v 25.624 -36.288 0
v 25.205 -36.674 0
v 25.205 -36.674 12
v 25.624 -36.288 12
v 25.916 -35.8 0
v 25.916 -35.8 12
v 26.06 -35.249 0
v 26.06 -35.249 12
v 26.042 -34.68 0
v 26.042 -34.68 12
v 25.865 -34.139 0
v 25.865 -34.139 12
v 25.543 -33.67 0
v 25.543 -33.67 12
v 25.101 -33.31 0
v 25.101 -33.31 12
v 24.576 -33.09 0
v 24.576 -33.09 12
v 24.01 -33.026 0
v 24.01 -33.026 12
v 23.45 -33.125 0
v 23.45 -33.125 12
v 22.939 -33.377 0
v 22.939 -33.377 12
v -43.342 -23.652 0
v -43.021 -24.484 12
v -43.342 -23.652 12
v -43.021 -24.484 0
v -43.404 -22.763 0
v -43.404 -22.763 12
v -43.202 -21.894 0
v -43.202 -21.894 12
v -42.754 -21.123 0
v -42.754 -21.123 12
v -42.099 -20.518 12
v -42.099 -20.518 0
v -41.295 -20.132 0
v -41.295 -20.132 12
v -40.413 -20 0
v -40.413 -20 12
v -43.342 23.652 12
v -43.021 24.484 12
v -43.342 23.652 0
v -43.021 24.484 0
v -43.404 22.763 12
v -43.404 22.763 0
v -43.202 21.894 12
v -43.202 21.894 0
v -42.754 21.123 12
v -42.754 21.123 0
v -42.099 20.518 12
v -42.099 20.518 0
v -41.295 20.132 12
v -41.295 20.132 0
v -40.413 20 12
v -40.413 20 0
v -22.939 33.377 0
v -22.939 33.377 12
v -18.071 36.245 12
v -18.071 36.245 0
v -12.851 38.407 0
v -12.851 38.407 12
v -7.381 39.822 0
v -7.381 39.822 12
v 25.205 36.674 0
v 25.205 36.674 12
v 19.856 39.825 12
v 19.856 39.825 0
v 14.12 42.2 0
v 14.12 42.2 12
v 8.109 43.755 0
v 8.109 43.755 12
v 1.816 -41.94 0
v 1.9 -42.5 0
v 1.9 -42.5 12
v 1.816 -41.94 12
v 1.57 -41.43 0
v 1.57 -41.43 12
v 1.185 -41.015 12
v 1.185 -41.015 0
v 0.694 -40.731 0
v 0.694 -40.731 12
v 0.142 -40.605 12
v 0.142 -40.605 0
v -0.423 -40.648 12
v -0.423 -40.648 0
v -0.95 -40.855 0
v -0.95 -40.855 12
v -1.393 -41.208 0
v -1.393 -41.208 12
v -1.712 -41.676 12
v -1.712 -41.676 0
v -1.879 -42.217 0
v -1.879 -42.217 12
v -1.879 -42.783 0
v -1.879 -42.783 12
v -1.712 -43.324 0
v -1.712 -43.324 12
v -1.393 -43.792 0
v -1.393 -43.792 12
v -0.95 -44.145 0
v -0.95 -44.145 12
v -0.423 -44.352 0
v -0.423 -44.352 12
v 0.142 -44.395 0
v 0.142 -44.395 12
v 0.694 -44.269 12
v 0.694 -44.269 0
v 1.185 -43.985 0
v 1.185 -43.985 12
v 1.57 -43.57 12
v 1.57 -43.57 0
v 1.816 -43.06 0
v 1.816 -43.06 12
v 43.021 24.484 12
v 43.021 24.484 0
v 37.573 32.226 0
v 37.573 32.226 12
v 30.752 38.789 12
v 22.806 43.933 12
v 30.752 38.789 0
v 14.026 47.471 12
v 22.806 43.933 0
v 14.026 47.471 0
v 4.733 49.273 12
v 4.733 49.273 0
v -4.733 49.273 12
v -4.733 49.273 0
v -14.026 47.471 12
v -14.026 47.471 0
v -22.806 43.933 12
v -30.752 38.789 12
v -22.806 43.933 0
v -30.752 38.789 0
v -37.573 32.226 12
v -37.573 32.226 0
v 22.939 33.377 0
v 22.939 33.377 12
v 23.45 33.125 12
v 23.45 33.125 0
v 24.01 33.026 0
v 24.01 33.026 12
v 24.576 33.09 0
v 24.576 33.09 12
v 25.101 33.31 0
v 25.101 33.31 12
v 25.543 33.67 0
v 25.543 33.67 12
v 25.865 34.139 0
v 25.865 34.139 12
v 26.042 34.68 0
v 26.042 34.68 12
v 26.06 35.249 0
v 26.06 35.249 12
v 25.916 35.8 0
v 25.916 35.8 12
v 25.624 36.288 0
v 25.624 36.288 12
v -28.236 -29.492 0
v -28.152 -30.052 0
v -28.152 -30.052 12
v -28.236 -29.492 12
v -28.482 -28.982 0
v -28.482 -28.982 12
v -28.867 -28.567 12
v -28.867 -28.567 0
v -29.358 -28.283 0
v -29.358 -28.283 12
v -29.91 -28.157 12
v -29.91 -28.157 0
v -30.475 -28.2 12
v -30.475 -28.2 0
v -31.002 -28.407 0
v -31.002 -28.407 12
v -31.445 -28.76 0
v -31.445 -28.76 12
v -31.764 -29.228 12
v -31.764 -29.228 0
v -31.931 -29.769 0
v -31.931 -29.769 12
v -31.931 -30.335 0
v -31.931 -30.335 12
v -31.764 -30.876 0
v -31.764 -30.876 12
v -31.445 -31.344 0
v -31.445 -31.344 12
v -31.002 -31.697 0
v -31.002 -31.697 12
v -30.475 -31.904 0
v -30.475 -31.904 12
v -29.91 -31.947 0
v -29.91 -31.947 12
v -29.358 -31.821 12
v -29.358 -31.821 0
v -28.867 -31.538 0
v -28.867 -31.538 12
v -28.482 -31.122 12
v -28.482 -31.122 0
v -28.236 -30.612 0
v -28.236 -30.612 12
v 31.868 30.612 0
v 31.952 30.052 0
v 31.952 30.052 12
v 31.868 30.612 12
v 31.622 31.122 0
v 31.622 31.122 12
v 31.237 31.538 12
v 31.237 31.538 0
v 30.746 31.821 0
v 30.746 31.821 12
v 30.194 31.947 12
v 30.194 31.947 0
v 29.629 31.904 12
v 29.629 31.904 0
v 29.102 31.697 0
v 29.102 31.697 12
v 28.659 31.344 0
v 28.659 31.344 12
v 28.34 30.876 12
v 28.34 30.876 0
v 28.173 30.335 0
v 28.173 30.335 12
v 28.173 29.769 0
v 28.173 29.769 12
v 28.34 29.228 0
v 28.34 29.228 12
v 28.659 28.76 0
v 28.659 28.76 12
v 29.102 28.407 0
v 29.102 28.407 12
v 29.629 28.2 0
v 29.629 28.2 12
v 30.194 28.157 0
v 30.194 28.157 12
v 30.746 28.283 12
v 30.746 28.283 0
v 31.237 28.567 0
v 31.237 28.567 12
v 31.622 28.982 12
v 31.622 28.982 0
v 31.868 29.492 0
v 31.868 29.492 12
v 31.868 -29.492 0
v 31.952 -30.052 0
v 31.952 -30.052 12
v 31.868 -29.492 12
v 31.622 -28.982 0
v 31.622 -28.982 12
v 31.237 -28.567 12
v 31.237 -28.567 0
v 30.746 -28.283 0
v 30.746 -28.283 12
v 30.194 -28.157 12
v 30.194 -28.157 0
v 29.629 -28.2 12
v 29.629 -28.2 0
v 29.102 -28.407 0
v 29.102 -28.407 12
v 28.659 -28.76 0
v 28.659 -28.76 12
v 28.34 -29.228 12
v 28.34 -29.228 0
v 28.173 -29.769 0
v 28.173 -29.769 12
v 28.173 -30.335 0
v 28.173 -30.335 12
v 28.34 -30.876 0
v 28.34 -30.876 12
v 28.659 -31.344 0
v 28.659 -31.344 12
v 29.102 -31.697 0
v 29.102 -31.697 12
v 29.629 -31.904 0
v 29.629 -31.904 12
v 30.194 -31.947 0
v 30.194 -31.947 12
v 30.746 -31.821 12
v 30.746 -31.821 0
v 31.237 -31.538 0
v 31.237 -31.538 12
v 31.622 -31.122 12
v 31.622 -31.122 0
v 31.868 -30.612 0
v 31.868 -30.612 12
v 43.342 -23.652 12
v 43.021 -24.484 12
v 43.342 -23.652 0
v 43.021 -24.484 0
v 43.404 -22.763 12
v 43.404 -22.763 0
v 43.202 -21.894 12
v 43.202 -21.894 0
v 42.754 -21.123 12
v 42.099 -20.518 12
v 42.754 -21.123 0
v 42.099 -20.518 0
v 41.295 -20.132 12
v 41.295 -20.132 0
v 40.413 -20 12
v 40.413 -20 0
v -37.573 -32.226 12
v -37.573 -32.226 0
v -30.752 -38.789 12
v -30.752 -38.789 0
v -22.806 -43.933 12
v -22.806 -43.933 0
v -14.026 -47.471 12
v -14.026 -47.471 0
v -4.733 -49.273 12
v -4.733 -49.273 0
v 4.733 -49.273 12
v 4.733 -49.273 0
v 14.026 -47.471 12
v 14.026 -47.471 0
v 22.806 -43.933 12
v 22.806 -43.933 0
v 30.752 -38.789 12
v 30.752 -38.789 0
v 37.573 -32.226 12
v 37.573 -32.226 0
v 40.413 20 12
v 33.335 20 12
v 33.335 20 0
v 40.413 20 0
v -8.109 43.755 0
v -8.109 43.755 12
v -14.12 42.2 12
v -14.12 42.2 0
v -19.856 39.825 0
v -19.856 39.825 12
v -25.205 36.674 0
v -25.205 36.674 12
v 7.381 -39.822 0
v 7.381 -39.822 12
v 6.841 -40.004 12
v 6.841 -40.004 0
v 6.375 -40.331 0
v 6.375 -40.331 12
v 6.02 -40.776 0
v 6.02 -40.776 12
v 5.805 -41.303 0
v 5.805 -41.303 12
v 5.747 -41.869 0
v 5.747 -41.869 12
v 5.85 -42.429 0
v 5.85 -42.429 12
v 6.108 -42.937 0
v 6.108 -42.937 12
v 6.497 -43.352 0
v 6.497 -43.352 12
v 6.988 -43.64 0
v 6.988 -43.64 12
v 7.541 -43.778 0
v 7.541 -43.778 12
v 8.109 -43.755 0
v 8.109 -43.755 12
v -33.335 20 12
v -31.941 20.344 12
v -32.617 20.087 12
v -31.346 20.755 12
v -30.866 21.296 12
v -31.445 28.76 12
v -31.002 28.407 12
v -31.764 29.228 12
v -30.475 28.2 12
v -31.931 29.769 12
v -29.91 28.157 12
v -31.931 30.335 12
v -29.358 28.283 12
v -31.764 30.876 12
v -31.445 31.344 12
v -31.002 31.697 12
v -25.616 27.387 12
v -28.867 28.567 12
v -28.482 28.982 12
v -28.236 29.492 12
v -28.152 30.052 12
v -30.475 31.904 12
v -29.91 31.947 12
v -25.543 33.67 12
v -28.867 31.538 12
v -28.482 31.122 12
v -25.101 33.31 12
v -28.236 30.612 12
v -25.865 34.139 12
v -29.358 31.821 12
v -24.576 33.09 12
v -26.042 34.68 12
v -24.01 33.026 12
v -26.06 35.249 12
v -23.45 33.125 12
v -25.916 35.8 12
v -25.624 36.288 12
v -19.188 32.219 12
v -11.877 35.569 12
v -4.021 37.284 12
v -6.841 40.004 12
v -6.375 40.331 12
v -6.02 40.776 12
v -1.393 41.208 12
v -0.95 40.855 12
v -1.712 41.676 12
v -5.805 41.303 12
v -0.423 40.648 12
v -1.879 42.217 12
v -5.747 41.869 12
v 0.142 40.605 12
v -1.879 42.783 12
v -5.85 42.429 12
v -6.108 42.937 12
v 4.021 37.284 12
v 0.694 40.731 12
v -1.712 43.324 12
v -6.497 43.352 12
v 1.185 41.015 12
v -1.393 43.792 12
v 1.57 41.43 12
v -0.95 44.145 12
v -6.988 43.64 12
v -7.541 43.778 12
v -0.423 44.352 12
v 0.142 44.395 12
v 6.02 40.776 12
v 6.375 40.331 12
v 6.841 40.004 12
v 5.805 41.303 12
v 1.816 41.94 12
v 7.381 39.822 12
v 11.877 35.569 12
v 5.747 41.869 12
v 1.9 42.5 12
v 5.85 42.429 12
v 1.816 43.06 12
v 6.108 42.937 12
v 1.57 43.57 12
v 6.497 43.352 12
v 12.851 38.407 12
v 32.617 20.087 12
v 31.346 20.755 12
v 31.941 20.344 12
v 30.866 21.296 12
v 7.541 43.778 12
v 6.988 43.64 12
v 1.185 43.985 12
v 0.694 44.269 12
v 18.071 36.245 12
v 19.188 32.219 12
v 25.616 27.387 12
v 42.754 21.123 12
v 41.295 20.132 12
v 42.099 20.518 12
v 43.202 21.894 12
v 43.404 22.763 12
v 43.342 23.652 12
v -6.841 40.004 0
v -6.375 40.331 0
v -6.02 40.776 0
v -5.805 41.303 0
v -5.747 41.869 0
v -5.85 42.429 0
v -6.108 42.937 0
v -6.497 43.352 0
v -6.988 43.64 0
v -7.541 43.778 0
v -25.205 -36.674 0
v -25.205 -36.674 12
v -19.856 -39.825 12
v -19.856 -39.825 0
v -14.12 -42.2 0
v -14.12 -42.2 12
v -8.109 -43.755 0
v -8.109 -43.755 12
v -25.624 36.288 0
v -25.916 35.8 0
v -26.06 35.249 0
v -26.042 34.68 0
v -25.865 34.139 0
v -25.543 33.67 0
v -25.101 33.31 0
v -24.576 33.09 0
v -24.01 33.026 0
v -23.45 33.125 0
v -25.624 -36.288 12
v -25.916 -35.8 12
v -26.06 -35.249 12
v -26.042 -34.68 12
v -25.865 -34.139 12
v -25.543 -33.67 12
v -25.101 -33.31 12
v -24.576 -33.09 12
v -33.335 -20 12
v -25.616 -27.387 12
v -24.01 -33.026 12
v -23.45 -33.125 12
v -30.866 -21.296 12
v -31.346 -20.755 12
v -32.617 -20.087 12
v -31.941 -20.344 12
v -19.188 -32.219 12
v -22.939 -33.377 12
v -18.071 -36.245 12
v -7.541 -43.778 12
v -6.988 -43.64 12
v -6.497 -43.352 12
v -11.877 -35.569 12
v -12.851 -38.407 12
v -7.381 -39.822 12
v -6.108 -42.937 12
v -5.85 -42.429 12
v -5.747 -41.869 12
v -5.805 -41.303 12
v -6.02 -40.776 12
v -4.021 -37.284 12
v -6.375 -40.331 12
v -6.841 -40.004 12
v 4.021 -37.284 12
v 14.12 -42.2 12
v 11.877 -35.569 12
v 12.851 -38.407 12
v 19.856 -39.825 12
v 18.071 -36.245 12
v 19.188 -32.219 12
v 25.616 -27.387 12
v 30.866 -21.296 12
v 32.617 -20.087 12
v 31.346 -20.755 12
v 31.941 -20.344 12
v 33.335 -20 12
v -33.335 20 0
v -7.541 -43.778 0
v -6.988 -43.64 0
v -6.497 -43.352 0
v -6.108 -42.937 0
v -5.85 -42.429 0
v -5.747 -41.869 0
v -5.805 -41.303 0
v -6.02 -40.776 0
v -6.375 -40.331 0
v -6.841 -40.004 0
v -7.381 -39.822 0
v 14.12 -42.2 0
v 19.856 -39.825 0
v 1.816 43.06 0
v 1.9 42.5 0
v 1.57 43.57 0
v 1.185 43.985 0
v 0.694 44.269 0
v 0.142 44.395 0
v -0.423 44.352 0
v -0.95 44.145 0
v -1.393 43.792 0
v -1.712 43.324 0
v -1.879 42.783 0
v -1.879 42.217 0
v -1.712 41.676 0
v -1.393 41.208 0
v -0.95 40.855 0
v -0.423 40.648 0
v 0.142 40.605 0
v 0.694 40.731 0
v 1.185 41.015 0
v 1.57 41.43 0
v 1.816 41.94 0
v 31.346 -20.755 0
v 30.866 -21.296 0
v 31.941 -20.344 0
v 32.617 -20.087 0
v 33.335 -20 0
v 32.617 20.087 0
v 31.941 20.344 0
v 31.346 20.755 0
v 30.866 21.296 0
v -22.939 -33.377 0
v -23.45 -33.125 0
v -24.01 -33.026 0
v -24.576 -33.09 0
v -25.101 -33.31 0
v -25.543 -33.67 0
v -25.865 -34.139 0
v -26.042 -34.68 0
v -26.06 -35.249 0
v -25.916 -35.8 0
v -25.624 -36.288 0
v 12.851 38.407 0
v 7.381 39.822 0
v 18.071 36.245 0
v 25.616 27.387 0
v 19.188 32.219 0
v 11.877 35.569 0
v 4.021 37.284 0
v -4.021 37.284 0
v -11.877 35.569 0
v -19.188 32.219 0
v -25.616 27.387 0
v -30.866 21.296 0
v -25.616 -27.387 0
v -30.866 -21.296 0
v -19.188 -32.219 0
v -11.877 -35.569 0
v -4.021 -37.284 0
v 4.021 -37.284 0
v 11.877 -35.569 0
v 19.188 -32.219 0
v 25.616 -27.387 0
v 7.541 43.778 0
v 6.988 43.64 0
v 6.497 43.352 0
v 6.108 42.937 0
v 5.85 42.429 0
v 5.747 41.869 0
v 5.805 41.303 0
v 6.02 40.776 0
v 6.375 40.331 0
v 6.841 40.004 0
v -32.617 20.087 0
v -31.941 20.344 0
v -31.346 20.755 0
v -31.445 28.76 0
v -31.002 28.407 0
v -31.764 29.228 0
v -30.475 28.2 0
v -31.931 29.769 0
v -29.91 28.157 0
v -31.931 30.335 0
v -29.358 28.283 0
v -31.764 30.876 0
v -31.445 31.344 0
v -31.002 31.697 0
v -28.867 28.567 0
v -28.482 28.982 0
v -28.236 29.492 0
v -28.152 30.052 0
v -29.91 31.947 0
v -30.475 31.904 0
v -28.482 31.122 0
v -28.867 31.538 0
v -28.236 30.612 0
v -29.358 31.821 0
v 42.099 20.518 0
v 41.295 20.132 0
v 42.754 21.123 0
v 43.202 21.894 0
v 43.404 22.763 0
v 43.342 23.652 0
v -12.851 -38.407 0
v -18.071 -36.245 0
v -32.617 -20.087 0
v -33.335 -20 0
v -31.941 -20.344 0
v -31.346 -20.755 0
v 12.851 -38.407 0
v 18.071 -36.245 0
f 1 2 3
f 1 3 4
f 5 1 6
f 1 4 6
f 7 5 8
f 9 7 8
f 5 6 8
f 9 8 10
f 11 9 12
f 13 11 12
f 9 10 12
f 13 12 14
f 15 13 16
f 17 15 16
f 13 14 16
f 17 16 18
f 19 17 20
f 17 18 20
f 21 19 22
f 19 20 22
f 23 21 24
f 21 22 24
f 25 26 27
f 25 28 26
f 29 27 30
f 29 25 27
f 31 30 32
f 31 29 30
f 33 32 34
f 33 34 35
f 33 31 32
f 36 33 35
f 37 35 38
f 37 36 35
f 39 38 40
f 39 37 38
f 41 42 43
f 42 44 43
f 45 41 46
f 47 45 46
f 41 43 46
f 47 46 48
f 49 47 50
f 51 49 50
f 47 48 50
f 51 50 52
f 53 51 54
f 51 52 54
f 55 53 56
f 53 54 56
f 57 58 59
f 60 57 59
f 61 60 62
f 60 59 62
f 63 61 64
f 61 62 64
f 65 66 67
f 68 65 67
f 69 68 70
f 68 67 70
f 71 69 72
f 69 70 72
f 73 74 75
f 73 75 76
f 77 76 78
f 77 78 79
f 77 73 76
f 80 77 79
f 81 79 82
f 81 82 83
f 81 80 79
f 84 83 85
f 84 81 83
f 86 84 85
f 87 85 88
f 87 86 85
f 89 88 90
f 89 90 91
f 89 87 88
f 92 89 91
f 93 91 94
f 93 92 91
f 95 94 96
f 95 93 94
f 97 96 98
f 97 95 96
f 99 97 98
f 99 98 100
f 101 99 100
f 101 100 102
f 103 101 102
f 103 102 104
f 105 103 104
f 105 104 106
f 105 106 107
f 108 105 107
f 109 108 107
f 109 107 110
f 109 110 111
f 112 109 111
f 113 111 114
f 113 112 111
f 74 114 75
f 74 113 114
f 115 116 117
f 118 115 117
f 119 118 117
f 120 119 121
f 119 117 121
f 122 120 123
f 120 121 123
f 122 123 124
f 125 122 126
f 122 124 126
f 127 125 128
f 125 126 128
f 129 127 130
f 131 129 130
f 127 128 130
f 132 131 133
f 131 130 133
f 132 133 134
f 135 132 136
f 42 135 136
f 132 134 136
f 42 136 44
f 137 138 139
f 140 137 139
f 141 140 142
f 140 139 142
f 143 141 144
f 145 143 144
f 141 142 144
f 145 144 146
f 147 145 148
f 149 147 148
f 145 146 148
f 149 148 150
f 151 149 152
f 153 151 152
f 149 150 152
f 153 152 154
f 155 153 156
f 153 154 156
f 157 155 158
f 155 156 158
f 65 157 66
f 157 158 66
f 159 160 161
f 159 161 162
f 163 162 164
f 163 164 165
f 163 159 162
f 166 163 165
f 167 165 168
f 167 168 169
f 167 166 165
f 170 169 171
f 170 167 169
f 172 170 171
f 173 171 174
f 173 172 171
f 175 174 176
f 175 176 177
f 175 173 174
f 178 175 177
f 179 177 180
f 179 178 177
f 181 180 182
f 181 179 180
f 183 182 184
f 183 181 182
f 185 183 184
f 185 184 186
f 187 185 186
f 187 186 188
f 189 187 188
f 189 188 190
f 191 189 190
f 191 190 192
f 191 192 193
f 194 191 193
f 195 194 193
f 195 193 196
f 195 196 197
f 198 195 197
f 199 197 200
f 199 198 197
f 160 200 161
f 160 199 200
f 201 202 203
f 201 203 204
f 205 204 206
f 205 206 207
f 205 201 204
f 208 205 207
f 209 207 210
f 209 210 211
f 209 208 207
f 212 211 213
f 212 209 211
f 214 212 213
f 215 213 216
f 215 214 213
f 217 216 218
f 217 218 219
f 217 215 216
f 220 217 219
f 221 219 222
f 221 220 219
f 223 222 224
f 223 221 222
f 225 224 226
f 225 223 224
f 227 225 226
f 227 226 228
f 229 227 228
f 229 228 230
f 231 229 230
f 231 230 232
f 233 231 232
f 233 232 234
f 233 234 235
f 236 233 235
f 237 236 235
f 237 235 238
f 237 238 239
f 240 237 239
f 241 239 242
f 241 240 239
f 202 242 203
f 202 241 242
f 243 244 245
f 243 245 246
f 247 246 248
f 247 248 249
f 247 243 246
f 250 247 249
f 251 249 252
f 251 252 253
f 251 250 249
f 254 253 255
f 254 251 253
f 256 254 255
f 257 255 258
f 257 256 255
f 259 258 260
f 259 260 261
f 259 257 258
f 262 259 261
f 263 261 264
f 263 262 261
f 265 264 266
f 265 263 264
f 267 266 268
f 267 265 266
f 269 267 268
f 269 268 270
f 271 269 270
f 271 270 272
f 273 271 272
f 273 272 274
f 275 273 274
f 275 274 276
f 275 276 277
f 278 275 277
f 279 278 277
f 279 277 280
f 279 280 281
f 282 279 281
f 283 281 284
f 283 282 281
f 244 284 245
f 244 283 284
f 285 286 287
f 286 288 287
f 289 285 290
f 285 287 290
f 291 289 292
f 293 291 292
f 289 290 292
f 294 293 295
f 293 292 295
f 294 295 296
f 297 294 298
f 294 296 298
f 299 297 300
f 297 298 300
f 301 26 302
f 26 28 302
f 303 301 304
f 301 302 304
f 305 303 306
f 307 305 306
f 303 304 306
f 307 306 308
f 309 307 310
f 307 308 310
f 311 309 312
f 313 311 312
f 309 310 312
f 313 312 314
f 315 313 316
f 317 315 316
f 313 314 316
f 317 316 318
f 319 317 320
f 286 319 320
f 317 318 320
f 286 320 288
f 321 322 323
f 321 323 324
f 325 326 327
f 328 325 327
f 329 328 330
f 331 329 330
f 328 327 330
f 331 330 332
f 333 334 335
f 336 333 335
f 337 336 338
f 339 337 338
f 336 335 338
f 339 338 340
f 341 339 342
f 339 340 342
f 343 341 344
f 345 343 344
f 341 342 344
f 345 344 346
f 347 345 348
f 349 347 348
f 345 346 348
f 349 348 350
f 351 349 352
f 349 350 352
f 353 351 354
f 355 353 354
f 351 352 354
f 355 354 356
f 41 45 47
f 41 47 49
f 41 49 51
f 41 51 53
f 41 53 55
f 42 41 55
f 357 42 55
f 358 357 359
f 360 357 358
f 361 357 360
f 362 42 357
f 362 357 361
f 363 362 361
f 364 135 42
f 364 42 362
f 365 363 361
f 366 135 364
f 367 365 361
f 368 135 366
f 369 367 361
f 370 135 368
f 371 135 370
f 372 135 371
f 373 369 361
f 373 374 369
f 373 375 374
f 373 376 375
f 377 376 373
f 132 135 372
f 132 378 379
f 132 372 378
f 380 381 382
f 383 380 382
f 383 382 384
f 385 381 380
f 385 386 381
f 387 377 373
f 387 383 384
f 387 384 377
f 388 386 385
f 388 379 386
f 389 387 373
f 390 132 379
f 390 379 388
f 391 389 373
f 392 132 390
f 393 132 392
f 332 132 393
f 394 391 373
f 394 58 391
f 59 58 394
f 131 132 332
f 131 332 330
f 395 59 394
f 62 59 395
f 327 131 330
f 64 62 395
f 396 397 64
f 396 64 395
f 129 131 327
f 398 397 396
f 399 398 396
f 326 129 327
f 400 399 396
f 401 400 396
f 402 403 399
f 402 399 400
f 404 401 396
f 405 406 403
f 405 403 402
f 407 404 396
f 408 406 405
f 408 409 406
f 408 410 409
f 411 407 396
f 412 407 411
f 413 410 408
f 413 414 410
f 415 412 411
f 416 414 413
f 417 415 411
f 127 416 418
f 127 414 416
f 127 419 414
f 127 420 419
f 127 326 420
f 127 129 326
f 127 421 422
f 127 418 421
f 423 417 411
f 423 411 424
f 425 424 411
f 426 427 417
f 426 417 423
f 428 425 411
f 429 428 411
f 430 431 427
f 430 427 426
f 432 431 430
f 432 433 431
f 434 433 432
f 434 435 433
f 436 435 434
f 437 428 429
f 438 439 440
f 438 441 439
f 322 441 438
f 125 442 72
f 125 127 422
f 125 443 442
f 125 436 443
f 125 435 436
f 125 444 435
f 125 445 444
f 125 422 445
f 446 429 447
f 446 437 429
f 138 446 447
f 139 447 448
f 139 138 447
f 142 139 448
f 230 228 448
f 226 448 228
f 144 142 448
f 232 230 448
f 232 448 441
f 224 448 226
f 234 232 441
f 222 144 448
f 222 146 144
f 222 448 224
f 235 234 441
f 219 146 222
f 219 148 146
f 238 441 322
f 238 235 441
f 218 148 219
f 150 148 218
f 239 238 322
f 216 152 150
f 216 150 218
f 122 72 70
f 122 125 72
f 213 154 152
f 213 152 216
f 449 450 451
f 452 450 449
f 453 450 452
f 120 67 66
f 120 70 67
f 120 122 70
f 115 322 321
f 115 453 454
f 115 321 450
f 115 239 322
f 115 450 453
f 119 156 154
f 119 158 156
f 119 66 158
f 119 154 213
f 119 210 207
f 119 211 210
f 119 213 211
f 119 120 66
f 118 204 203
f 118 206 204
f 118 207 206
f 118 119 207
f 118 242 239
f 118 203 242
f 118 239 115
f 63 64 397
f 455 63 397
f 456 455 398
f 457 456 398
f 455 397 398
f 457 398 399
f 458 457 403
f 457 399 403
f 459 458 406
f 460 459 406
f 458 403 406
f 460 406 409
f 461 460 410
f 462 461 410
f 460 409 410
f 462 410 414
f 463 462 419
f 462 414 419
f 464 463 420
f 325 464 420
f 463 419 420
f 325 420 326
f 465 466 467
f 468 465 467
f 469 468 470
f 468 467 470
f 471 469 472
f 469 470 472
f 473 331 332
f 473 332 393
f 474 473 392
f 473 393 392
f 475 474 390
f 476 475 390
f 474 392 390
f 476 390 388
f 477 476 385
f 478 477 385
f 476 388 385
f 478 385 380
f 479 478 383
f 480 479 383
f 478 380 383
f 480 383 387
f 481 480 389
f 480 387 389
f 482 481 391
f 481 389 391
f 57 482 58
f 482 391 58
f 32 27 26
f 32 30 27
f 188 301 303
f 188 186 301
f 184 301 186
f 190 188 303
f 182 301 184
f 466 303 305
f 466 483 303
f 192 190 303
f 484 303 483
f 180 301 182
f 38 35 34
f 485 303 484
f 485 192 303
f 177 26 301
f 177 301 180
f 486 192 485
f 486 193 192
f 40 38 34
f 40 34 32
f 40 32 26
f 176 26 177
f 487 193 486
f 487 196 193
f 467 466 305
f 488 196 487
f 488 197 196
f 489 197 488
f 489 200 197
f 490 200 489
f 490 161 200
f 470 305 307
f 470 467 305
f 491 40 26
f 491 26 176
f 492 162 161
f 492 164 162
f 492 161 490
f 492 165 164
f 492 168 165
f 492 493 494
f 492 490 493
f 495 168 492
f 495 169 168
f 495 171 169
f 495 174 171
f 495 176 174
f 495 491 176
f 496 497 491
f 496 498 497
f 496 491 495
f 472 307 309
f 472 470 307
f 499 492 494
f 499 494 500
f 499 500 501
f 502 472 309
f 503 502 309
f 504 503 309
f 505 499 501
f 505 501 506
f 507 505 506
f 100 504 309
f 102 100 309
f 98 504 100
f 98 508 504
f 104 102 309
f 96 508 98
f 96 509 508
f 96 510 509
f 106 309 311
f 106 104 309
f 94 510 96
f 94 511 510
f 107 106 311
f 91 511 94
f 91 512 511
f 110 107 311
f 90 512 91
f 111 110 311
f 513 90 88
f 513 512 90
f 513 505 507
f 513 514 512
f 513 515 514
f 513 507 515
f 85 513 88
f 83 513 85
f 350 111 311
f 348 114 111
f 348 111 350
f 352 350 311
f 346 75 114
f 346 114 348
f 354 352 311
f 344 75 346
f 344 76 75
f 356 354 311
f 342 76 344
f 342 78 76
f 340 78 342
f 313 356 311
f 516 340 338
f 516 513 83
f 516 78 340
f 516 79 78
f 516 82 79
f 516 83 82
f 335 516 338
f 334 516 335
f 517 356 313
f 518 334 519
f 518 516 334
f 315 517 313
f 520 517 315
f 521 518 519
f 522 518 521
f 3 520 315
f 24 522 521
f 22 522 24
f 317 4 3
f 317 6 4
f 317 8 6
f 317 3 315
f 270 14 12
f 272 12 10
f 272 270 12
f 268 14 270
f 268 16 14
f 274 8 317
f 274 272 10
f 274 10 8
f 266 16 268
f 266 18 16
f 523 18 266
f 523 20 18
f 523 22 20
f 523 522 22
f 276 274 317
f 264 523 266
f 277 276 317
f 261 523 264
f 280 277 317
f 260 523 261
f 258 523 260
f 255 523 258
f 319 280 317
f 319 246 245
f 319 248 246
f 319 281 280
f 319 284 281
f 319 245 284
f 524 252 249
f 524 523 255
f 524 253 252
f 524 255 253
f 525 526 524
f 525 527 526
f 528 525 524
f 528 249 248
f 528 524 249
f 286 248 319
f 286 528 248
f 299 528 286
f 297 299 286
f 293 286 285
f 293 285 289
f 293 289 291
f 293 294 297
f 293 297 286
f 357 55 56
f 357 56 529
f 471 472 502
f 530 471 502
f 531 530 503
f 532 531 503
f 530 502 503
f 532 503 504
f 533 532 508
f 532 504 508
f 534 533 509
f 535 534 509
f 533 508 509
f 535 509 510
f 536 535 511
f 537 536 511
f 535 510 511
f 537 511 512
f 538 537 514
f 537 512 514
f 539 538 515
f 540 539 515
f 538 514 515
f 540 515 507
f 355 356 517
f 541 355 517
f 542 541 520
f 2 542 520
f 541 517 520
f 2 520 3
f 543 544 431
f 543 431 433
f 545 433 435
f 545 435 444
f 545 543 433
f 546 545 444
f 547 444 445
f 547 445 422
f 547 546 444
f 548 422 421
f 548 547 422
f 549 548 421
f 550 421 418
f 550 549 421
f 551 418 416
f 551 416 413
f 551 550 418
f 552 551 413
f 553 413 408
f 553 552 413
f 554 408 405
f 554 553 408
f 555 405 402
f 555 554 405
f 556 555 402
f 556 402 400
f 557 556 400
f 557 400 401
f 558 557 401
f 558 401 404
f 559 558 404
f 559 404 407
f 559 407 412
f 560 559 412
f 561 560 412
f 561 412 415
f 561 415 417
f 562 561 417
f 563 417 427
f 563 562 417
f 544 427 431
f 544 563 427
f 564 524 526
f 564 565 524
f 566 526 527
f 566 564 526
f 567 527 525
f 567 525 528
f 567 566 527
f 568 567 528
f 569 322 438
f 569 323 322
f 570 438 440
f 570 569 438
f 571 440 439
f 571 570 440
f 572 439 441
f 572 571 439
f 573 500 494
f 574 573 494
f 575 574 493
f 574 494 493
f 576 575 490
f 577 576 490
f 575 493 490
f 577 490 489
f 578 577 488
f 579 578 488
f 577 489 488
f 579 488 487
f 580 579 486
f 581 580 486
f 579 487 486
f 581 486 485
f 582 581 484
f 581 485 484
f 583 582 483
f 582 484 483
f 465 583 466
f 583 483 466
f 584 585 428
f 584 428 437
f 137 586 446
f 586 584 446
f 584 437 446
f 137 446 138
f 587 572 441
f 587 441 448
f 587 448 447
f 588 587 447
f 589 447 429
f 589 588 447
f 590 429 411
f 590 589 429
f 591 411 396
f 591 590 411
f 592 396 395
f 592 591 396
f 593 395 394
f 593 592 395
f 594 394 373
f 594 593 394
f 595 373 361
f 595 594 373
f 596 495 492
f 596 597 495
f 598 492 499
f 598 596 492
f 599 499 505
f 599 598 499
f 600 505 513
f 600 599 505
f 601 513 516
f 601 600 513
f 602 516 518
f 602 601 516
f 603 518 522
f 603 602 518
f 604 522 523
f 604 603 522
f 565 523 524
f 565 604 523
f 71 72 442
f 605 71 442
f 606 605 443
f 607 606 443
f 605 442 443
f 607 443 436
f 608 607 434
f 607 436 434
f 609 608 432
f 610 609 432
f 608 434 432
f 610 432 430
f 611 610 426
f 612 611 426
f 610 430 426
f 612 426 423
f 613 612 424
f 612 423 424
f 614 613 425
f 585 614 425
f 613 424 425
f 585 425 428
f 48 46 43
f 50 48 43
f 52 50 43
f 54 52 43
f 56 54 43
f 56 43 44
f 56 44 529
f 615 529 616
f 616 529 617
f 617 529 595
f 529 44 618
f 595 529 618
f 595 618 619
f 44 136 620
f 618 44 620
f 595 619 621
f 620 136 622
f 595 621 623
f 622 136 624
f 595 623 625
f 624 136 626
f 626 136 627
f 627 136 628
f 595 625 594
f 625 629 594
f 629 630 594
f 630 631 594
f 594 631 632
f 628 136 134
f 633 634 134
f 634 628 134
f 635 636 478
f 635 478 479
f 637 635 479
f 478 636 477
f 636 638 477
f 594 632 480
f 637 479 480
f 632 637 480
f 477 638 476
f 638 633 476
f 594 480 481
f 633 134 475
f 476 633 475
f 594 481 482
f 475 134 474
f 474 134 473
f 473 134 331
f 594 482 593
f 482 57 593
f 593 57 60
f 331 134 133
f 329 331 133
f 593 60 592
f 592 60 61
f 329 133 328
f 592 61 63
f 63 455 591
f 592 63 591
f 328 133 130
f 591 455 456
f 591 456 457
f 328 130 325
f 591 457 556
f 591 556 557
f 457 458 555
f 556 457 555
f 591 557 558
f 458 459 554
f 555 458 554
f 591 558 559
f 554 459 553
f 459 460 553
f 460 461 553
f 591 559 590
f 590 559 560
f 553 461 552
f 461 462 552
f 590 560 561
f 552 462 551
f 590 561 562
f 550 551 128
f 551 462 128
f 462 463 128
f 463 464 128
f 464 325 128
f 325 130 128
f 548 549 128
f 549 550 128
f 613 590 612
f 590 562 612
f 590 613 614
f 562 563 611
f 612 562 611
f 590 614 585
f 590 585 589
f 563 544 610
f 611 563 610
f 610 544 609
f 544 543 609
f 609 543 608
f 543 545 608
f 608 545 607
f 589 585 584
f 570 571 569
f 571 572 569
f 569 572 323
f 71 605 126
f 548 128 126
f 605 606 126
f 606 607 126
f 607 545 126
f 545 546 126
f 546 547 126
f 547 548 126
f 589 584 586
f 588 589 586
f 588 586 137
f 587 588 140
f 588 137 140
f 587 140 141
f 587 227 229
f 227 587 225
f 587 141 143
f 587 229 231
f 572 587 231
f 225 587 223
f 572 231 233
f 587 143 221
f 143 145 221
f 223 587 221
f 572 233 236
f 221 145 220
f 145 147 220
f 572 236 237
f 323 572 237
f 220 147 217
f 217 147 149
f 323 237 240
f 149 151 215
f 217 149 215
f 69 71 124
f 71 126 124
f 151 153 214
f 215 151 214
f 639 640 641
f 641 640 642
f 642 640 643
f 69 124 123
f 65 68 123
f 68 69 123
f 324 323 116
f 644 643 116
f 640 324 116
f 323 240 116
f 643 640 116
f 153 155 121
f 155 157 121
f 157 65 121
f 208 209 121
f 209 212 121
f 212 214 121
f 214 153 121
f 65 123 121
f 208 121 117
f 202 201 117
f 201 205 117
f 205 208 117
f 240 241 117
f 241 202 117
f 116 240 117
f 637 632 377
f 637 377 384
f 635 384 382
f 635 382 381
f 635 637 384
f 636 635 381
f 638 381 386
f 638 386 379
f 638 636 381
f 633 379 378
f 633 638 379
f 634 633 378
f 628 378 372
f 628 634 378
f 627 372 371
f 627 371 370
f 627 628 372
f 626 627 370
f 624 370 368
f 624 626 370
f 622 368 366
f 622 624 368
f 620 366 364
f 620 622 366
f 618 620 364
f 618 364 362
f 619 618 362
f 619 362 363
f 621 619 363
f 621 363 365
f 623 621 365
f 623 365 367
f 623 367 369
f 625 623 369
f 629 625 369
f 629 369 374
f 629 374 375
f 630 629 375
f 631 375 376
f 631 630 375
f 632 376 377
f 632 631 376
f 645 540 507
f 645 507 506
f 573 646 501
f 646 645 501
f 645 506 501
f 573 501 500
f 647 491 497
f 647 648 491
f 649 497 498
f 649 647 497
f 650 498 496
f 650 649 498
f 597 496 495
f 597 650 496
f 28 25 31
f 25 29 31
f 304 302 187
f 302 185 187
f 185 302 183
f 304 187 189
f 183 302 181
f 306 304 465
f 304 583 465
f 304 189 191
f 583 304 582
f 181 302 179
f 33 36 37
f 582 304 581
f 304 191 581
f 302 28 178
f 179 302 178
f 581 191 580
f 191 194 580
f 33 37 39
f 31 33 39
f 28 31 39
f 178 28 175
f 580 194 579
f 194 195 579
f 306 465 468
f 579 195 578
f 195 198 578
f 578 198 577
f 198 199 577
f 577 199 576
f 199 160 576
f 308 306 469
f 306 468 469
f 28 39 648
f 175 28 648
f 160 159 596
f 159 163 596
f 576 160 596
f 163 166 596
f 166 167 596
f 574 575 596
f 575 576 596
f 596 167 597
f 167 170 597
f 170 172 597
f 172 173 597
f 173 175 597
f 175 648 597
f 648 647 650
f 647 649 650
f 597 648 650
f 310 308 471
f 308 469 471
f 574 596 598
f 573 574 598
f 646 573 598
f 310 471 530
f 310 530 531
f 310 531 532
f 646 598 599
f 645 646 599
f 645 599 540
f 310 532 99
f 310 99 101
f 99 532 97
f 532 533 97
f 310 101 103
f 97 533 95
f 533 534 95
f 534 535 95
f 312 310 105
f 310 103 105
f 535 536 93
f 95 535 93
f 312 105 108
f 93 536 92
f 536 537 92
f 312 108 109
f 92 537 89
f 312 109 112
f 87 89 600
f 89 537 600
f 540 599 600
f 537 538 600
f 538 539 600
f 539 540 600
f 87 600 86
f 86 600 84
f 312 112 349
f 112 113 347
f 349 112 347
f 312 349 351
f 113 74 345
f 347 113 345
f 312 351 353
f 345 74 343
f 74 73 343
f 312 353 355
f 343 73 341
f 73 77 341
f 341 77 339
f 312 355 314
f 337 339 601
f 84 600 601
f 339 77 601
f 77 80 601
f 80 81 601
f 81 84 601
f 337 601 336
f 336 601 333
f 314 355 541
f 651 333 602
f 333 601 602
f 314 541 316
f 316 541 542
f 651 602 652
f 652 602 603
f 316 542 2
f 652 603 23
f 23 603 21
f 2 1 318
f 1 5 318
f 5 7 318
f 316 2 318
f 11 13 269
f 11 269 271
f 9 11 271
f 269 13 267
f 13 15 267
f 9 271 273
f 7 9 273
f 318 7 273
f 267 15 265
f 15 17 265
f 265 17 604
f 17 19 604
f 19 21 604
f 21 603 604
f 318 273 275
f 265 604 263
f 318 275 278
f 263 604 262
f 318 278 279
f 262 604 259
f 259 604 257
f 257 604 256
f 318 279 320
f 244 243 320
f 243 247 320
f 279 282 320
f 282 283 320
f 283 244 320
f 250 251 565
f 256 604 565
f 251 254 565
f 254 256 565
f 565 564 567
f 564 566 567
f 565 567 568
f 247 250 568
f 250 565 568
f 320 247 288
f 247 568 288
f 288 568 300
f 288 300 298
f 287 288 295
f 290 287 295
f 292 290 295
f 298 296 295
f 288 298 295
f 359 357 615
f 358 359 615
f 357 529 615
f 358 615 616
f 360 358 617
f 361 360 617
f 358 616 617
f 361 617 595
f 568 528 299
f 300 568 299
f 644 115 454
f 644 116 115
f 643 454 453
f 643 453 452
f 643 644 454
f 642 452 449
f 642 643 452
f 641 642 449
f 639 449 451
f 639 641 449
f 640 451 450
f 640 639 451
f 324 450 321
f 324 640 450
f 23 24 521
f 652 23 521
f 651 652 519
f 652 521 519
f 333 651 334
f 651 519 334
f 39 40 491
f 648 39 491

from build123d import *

# Parameters (mm, degrees)
SKETCH_1_R          = 49.5
SKETCH_1_R_2        = 37.5
SKETCH_1_R_3        = 1.9
EXTRUDE_1_DEPTH     = 12
CUT_EXTRUDE_1_DEPTH = 16
SKETCH_4_W          = 99
SKETCH_4_H          = 40
CUT_EXTRUDE_2_DEPTH = 20
FILLET_1_R          = 3
FILLET_2_R          = 3


with BuildPart() as part:
    # 草图1 → 凸台-拉伸1 (new body)
    with BuildSketch(Plane.XY):
        Circle(SKETCH_1_R)
        Circle(SKETCH_1_R_2, mode=Mode.SUBTRACT)
        with Locations((0, 42.5)):
            Circle(SKETCH_1_R_3, mode=Mode.SUBTRACT)
        with Locations((30.0520382, 30.0520382)):
            Circle(SKETCH_1_R_3, mode=Mode.SUBTRACT)
        with Locations((30.0520382, -30.0520382)):
            Circle(SKETCH_1_R_3, mode=Mode.SUBTRACT)
        with Locations((0, -42.5)):
            Circle(SKETCH_1_R_3, mode=Mode.SUBTRACT)
        with Locations((-30.0520382, -30.0520382)):
            Circle(SKETCH_1_R_3, mode=Mode.SUBTRACT)
        with Locations((-30.0520382, 30.0520382)):
            Circle(SKETCH_1_R_3, mode=Mode.SUBTRACT)
        with Locations((-42.5, 0)):
            Circle(SKETCH_1_R_3, mode=Mode.SUBTRACT)
        with Locations((42.5, 0)):
            Circle(SKETCH_1_R_3, mode=Mode.SUBTRACT)
    extrude(amount=EXTRUDE_1_DEPTH)

    # 草图2 → 切除-拉伸1 (cut)
    with BuildSketch(Plane.XY.offset(12)):
        with BuildLine():
            ThreePointArc((-8.109480884, 43.754843387), (-17.02941274, 41.112639197), (-25.205077543, 36.673615394))
            ThreePointArc((-25.205077543, 36.673615394), (-25.720517447, 33.892550543), (-22.939452595, 33.377110639))
            ThreePointArc((-22.939452595, 33.377110639), (-15.498679011, 37.417121067), (-7.380538782, 39.821823756))
            ThreePointArc((-7.380538782, 39.821823756), (-5.778500018, 42.152804622), (-8.109480884, 43.754843387))
        make_face()
        with BuildLine():
            ThreePointArc((25.205077543, 36.673615394), (17.02941274, 41.112639197), (8.109480884, 43.754843387))
            ThreePointArc((8.109480884, 43.754843387), (5.778500018, 42.152804622), (7.380538782, 39.821823756))
            ThreePointArc((7.380538782, 39.821823756), (15.498679011, 37.417121067), (22.939452595, 33.377110639))
            ThreePointArc((22.939452595, 33.377110639), (25.720517447, 33.892550543), (25.205077543, 36.673615394))
        make_face()
        with BuildLine():
            ThreePointArc((8.109480884, -43.754843387), (17.02941274, -41.112639197), (25.205077543, -36.673615394))
            ThreePointArc((25.205077543, -36.673615394), (25.720517447, -33.892550543), (22.939452595, -33.377110639))
            ThreePointArc((22.939452595, -33.377110639), (15.498679011, -37.417121067), (7.380538782, -39.821823756))
            ThreePointArc((7.380538782, -39.821823756), (5.778500018, -42.152804622), (8.109480884, -43.754843387))
        make_face()
        with BuildLine():
            ThreePointArc((-25.205077543, -36.673615394), (-17.02941274, -41.112639197), (-8.109480884, -43.754843387))
            ThreePointArc((-8.109480884, -43.754843387), (-5.778500018, -42.152804622), (-7.380538782, -39.821823756))
            ThreePointArc((-7.380538782, -39.821823756), (-15.498679011, -37.417121067), (-22.939452595, -33.377110639))
            ThreePointArc((-22.939452595, -33.377110639), (-25.720517447, -33.892550543), (-25.205077543, -36.673615394))
        make_face()
    extrude(amount=-CUT_EXTRUDE_1_DEPTH, mode=Mode.SUBTRACT)

    # 草图4 → 切除-拉伸2 (cut)
    with BuildSketch(Plane.XY.offset(12)):
        Rectangle(SKETCH_4_W, SKETCH_4_H)
    extrude(amount=-CUT_EXTRUDE_2_DEPTH, mode=Mode.SUBTRACT)


with BuildPart() as cut_extrude_2_piece_1:
    # of the separate pieces the step leaves, piece 1, a body of its own (cut_extrude_2_pieces)
    add(part.part.solids().sort_by_distance((45.279686395, 20, 0))[0])

    # 圆角1
    fillet_1_edges = [cut_extrude_2_piece_1.edges().sort_by_distance(p)[0] for p in [
        (-31.721443851, 20, 6),
        (31.721443851, 20, 6),
        (45.279686395, 20, 6),
        (-45.279686395, 20, 6),
    ]]
    fillet(fillet_1_edges, radius=FILLET_1_R)


with BuildPart() as cut_extrude_2_piece_2:
    # of the separate pieces the step leaves, piece 2, a body of its own (cut_extrude_2_pieces)
    add(part.part.solids().sort_by_distance((-45.279686395, -20, 0))[0])

    # 圆角2
    fillet_2_edges = [cut_extrude_2_piece_2.edges().sort_by_distance(p)[0] for p in [
        (-45.279686395, -20, 6),
        (45.279686395, -20, 6),
        (31.721443851, -20, 6),
        (-31.721443851, -20, 6),
    ]]
    fillet(fillet_2_edges, radius=FILLET_2_R)


solid = Compound([cut_extrude_2_piece_1.part, cut_extrude_2_piece_2.part])
